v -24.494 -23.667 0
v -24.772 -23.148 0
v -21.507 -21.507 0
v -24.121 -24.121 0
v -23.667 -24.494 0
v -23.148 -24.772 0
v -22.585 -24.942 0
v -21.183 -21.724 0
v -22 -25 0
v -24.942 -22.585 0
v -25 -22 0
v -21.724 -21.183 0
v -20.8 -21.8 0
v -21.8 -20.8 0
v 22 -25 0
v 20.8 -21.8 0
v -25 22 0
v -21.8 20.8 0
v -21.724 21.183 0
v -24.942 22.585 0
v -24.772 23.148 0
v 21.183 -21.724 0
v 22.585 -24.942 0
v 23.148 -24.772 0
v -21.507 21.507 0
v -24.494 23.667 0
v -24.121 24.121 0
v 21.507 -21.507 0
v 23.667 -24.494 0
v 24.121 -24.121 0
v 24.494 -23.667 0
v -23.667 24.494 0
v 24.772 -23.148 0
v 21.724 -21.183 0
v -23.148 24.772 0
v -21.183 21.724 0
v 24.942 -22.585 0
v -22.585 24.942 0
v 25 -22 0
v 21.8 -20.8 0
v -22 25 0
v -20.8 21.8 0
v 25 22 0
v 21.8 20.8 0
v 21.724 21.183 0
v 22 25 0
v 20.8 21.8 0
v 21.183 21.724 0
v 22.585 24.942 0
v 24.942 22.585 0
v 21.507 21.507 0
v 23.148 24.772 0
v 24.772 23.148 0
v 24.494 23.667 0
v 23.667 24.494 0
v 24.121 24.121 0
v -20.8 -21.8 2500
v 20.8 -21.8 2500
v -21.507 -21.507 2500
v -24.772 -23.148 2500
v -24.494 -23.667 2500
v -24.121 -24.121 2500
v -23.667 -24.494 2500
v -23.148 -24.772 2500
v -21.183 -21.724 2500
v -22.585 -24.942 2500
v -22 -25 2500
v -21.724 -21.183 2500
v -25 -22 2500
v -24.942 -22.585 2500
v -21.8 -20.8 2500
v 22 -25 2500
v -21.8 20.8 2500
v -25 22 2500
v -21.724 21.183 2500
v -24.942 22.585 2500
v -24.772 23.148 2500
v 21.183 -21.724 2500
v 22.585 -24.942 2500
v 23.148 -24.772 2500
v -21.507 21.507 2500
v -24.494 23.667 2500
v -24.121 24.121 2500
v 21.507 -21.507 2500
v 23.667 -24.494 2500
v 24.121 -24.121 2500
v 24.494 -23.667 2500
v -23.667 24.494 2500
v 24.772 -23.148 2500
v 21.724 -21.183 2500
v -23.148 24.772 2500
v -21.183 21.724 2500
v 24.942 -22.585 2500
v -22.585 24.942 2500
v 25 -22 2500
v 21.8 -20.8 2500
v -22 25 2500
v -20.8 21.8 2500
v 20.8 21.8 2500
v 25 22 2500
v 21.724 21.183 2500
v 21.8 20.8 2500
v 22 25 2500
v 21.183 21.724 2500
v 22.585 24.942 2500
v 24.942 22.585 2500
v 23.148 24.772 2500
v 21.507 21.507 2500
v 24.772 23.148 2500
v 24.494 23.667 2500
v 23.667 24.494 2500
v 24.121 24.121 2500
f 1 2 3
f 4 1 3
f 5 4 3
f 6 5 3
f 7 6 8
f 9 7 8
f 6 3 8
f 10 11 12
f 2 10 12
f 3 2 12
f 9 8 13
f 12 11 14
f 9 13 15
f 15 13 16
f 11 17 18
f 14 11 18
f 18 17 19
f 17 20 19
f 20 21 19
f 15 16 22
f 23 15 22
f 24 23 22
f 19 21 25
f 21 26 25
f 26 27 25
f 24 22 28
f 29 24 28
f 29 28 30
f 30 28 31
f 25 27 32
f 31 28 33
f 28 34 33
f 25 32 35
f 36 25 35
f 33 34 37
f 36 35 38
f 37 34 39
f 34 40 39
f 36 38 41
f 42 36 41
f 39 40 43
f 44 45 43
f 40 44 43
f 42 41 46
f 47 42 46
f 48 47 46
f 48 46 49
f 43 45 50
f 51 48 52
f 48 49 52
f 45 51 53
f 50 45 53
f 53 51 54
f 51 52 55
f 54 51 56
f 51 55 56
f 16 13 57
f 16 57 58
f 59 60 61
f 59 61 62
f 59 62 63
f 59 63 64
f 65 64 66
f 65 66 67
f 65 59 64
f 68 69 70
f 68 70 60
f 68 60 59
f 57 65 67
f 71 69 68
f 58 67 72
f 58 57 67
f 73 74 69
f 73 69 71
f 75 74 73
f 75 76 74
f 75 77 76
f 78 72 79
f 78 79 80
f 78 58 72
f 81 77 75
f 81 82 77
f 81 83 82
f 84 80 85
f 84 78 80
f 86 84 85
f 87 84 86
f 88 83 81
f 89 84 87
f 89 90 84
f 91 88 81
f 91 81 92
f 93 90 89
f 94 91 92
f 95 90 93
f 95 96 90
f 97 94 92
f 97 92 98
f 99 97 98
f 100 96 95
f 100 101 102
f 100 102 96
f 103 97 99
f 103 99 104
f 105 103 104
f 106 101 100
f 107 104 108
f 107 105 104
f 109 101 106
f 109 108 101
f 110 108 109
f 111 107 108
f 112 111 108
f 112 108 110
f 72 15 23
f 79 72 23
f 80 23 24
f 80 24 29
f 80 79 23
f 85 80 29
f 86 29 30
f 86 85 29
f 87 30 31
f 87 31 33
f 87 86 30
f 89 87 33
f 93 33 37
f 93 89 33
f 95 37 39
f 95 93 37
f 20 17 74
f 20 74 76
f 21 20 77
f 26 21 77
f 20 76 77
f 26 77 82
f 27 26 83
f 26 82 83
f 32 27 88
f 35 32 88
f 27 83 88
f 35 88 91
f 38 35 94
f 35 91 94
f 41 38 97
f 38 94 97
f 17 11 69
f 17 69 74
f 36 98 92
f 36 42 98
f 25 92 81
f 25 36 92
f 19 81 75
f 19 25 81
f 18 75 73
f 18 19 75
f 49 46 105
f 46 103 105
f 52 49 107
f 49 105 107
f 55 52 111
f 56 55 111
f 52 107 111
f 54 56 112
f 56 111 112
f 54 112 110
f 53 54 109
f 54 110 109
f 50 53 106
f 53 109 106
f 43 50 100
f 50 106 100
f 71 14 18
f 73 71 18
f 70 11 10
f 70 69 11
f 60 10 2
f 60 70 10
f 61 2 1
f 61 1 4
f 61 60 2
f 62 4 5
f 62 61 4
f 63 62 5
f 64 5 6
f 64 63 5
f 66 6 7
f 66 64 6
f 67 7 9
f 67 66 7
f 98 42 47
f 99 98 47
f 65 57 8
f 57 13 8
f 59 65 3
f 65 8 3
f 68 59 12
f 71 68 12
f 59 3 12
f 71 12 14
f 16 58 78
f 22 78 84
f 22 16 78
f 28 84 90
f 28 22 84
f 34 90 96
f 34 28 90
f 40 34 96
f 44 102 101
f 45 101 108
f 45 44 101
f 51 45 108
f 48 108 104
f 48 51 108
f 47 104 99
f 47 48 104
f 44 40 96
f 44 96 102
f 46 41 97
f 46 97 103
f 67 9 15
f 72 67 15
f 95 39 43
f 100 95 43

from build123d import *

# Parameters (mm, degrees)
F0_W     = 50
F0_H     = 50
F1_DEPTH = 2500
F2_W     = 43.6
F2_H     = 43.6
F3_DEPTH = 2500.001
F4_R     = 3
F5_R     = 1


with BuildPart() as f1:
    # F0 (on Top) → F1 (new body)
    with BuildSketch(Plane.XY):
        Rectangle(F0_W, F0_H)
    extrude(amount=F1_DEPTH)

    # F2 (on face) → F3 (cut, through all)
    with BuildSketch(Plane.XY.offset(2500)):
        Rectangle(F2_W, F2_H)
    extrude(amount=-F3_DEPTH, mode=Mode.SUBTRACT)

    # F4
    f4_edges = [f1.edges().sort_by_distance(p)[0] for p in [
        (25, -25, 1250),
        (25, 25, 1250),
        (-25, -25, 1250),
        (-25, 25, 1250),
    ]]
    fillet(f4_edges, radius=F4_R)

    # F5
    f5_edges = [f1.edges().sort_by_distance(p)[0] for p in [
        (21.8, -21.8, 1250),
        (-21.8, 21.8, 1250),
        (21.8, 21.8, 1250),
        (-21.8, -21.8, 1250),
    ]]
    fillet(f5_edges, radius=F5_R)


solid = f1.part
